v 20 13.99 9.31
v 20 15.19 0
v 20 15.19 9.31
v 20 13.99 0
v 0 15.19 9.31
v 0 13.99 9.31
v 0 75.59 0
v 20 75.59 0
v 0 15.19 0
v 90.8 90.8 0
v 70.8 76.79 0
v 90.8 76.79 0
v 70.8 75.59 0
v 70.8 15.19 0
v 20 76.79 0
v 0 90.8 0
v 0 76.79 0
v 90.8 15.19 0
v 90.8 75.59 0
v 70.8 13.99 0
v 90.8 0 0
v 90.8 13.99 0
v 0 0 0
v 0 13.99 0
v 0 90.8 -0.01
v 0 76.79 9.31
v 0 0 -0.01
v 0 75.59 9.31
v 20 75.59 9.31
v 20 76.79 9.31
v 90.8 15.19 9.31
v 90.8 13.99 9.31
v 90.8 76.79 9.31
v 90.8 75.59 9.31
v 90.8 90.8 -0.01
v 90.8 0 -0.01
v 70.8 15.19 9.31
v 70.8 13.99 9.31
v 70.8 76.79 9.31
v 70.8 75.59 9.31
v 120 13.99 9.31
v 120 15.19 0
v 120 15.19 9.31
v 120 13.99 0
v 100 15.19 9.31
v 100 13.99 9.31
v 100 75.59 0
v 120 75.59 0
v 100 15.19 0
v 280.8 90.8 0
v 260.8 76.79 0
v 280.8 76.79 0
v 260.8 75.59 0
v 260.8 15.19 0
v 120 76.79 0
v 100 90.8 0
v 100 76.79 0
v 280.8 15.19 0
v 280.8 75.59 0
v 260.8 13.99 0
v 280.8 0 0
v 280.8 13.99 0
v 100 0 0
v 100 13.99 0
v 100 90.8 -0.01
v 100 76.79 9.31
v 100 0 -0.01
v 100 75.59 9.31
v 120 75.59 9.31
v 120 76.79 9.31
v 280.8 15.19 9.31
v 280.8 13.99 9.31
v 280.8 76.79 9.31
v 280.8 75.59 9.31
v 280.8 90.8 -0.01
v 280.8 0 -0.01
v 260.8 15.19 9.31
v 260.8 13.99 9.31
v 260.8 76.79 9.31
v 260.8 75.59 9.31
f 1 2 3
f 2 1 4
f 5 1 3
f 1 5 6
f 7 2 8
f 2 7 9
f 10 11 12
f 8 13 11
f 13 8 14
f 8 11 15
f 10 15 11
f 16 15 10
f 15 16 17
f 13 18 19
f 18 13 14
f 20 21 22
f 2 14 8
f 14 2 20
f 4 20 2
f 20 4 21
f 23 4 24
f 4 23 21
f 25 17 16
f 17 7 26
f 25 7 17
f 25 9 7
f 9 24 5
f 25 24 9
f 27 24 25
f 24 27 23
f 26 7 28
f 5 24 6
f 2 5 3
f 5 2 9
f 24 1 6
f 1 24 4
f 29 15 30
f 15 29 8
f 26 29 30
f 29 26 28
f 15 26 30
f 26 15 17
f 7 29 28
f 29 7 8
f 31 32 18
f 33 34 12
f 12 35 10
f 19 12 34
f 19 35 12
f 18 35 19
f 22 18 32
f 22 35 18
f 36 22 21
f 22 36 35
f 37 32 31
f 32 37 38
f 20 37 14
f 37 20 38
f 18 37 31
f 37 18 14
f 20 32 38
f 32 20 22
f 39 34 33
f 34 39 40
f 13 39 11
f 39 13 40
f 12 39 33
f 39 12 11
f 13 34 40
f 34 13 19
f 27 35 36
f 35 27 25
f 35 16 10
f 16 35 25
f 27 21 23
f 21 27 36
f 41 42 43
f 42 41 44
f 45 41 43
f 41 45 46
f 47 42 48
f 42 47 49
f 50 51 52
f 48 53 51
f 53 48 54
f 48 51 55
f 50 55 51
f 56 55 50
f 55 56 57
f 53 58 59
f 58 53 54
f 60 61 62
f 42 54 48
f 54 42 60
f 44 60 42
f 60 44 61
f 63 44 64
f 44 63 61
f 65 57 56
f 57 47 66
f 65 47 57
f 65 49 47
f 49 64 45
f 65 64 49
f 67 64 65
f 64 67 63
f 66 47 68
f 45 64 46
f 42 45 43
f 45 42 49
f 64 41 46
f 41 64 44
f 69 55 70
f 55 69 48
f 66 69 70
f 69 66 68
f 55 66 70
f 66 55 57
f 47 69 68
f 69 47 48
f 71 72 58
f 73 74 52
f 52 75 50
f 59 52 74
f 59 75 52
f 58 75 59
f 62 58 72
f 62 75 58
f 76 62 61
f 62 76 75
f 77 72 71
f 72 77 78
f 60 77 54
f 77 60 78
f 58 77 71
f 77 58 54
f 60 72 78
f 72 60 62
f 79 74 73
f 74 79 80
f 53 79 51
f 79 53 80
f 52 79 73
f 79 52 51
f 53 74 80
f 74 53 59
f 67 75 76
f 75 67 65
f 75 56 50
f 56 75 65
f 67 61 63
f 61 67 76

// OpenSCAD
// file: ../../Base/Boxes.scad
// Fischertechnik Box Foundation
// Pre-designed Boxes

use <Constants.scad>

include <PlacementOptions.scad>

box190Width = 190;
box190Depth = 130;
box130Width = 130;
box130Depth = 95;
boxUsageHeight = 33.9;
boxWallThickness = 2.4;
boxBaseThickness = 1.0;
boxWebWidth = 3.0;

// getBoxWallThickness()
// Gets the wall thickness of a Fischertechnik Box

function getBoxWallThickness() = boxWallThickness;

// Gets the usable height of a fischertechnik box
function getBoxUsageHeight() = boxUsageHeight;

// Gets the thickness of the Fischertechnik box base.
function getBoxBaseThickness() = boxBaseThickness;

// Gets the width of a box web
function getBoxWebWidth() = boxWebWidth;

// Gets the usable inner space of a Box 190 as an x/y-list
function getBox190Space() = [
    box190Width - 2*getBoxWallThickness(), 
    box190Depth - 2*getBoxWallThickness() ];

// Imports the Fischertechnik empty box 130x190 mm and places it at position 0,0
// 190x130 are the outer sizes, the inner space is slightly smaller. Use getBox190Space() to get the inner sizes.
// This module needs the STL file "Fischertechnik Box 130x190.stl" in the library path.
// The box is positioned that the usable inner space is at the 0,0,0 position. The

module Box190() {
    translate([-getBoxWallThickness(),-getBoxWallThickness(),-getBoxBaseThickness()])
        import("Fischertechnik Box 130x190.stl", convexity=3);
}

// Gets the usable inner space of a Box 130 as an x/y-list
function getBox130Space() = [
    box130Width - 2*getBoxWallThickness(), 
    box130Depth - 2*getBoxWallThickness() ];

// Imports the Fischertechnik empty box 95x130 mm and places it at position 0,0
// 190x130 are the outer sizes, the inner space is slightly smaller. Use getBox190Space() to get the inner sizes.
// This module needs the STL file "Fischertechnik Box 95x130.stl" in the library path.
// The box is positioned that the usable inner space is at the 0,0,0 position. The

module Box130() {
    translate([-getBoxWallThickness(),-getBoxWallThickness(),-getBoxBaseThickness()])
        import("Fischertechnik Box 95x130.stl", convexity=3);
}

// Creates a web at the specified box walls
// corner 0 = LowerLeft, 1 = UpperLeft, 2 = UpperRight, 3 = LowerRight
// side 0 = LeftOfCorner, 1 = RightOfCorner
// distance = Distance in mm from the corner
// boxSpace = inner width and depth of the box (default: Box 190)
// webWidth = length of the web (default is 3 mms)
// webThickness = thickness of the web (default is 1 mm)

module BoxWeb(corner, side, distance, boxSpace=getBox190Space(), webWidth=getBoxWebWidth(), webThickness=1.0) {
    sink = getBoxWallThickness()/2;

    width = (corner % 2 == 0) ? 
            (side == LeftOfCorner ? webWidth : webThickness) :
            (side == LeftOfCorner ? webThickness : webWidth);

    depth = (corner % 2 == 0) ? 
            (side == RightOfCorner ? webWidth : webThickness) :
            (side == RightOfCorner ? webThickness : webWidth);
    
    xDiff = corner == LowerLeft ? 
                (side == LeftOfCorner ? -sink : distance) :
            (corner == UpperLeft ?                
                (side == LeftOfCorner ? distance : -sink) :
            (corner == UpperRight ?
                (side == LeftOfCorner ? boxSpace.x-webWidth+sink : boxSpace.x-distance-webThickness) :
                (side == LeftOfCorner ? boxSpace.x-distance-webThickness: boxSpace.x-webWidth+sink)));

    yDiff = corner == LowerLeft ? 
                (side == RightOfCorner ? -sink : distance) :
            (corner == UpperLeft ?
                (side == RightOfCorner ? boxSpace.y-distance : boxSpace.y-webWidth+sink) :
            (corner == UpperRight ?
                (side == RightOfCorner ? boxSpace.y-webWidth+sink : boxSpace.y-distance) :
                (side == RightOfCorner ? distance : -sink)));
    
    translate([xDiff, yDiff, -getExcess()])
        cube([width, depth, boxUsageHeight + 2*getExcess()]);
}
// file: ../../Base/Rotation.scad
// Fischertechnik Box Foundation
// Geometry Helpers Rotation

include <PlacementOptions.scad>

// getRotatedSpace(space, rotation=NoRotation)
// Rotates the space dependent on the specified rotation

function getRotatedSpace(space, rotation=NoRotation) = [
    (rotation == Rotate90 || rotation == Rotate270) ? space.y : space.x,
    (rotation == Rotate90 || rotation == Rotate270) ? space.x : space.y
];

// Rotates the given space around the fixed left lower corner
// space = the space the children needs as width/depth list [width,depth]
// rotation = 0 Rotate0 degrees, 1 Rotate90 degrees, 2 Rotate180 degrees, 3 Rotate270 degrees (equivalent to -90)

module RotateFix(space, rotation=Rotate0) {
    dy = (rotation == Rotate0 || rotation == Rotate270) ? 0 :
        (rotation == Rotate90) ? space.x :
        space.y;
    dx = (rotation < Rotate180) ? 0 :
        (rotation == Rotate180) ? space.x :
        space.y;
    
    translate([dx, dy, 0])
        rotate([0, 0, rotations[rotation]])
            children();
}
// file: ../../Base/Alignment.scad
// Fischertechnik Box Foundation
// Geometry Helpers Alignment

include <PlacementOptions.scad>

// getAlignedX(elementWidth, spaceWidth, align=AlignRight, offset=0)
// Gets the aligned X offset of an element with the given
// width in the given space.
// elementWidth = The width of the element to positon
// spaceWidth = The space where the element should be aligned
// align = 0 AlignLeft, 1 AlignCenter, 2 AlignRight
// offset = an optional offset from the aligned position. When
// aligned left or centered, then positive values are in X direction.
// When aligned right then positive values are in negative X direction.

function getAlignedX(elementWidth, spaceWidth, align=AlignRight, offset=0) =
    (align == AlignLeft) ?
        offset :
        ((align == AlignCenter) ?
        (spaceWidth - elementWidth)/2 + offset :
        spaceWidth - offset - elementWidth);

// getAlignedY(elementDepth, spaceDepth, align=AlignTop, offset=0)
// Gets the aligned Y offset of an element with the given
// depth in the given space.
// elementDepth = The depth of the element to positon
// spaceDepth = The space where the element should be aligned
// align = 0 AlignBottom, 1 AlignCenter, 2 AlignTop
// offset = an optional offset from the aligned position. When
// aligned bottom or centered, then positive values are in Y direction.
// When aligned top then positive values are in negative Y direction.

function getAlignedY(elementDepth, spaceDepth, align=AlignTop, offset=0) =
    (align == AlignBottom) ?
        offset :
        ((align == AlignCenter) ?
        (spaceDepth - elementDepth)/2 + offset :
        spaceDepth - offset - elementDepth);
// file: ../../Base/PlacementOptions.scad
// Fischertechnik Box Foundation
// Placement Options

// Alignment
NoAlign = 0;
AlignLeft = 1;
AlignBottom = 2;
AlignCenter = 3;
AlignRight = 4;
AlignTop = 5;

// Element rotation degree steps
rotations = [0, -90, -180, -270];

// Rotation
NoRotation = 0;
Rotate0 = 0;
Rotate90 = 1;
Rotate180 = 2;
Rotate270 = 3;

// Docking (seen from above)
NoDock = -1;
DockLeft = 0;
DockTop = 1;
DockRight = 2;
DockCorner = 2;
DockBottom = 3;

// Web corners
LowerLeft = 0;
UpperLeft = 1;
UpperRight = 2;
LowerRight = 3;

// Web position relative to corner
LeftOfCorner = 0;
RightOfCorner = 1;
// file: ../../Base/Placement.scad
// Fischertechnik Box Foundation
// Geometry Helpers Placement

use <Constants.scad>
use <Alignment.scad>
use <Rotation.scad>
use <Boxes.scad>

include <PlacementOptions.scad>

// Place(x=0, y=0, elementSpace=[0,0], alignX=AlignLeft, alignY=AlignBottom, rotation=Rotate0, boxSpace=getBox190Space())
// Places the child at the specified position
// y = Y-Position. This is a relative position when an X aligment is specified.
// x = X-Position. This is a relative position when an Y aligment is specified.
// elementSpace = space of the element to be placed [x,y]
// alignX = -1=NoAlign, 0 AlignLeft, 1 AlignCenter, 3 AlignRight (elementSpace and boxSpace required!)
// alignY = -1=NoAlign, 2 AlignBottom, 1 AlignCenter, 4 AlignTop (elementSpace and boxSpace required!)
// rotation = 0 Rotate0 0 degrees, 1 Rotate90 90 degrees, 
// 2 Rotate180 180 degrees, 3 Rotate270 270 degrees (equivalent to -90)
// boxSpace = Inner space of the box where the placement occurs [x,y] - default is Box 190x130 inner space

module Place(x=0, y=0, elementSpace=[0,0], 
  alignX=AlignLeft, alignY=AlignBottom, 
  rotation=NoRotation, boxSpace=getBox190Space()) {

    module Position(x, y, space, rotation=Rotate0) {
        translate([x, y, 0])
            RotateFix(space, rotation)
                children();
    }

    space = getRotatedSpace(elementSpace, rotation);
    alignedX = getAlignedX(space.x, boxSpace.x, alignX, x);
    alignedY = getAlignedY(space.y, boxSpace.y, alignY, y);
    Position(alignedX, alignedY, elementSpace, rotation)
        children();
}

// Center(space=getBox130Space(), elementSpace=[0,0])
// space = Space where the children is centered. For cylinder use centered=true and no elementSpace.
// elementSpace = space of the element to be centered [x,y]

module Center(space=getBox190Space(), elementSpace=[0,0]) {
    Place(elementSpace=elementSpace, boxSpace=space, alignX=AlignCenter, alignY=AlignCenter)
        children();
}

// CenterHorizontal(width=0, y=0, offset=0, space=getBox130Space())
// width = Width of the element to be placed.
// y = Y position of the element
// offset = Offset from the center position (negative will be left of the center)
// space = Space where the element is placed

module CenterHorizontal(width=0, y=0, offset=0, space=getBox190Space()) {
    Place(x=offset, y=y, elementSpace=[width, 0], boxSpace=space, alignX=AlignCenter)
        children(0);
}

// CenterVertical(depth=0, x=0, offset=0, space=getBox130Space())
// depth = Depth of the element to be placed.
// x = X position of the element
// offset = Offset from the center position (negative will be down of the center)
// space = Space where the element is placed

module CenterVertical(depth=0, x=0, offset=0, space=getBox190Space()) {
    Place(x=x, y=offset, elementSpace=[0, depth], boxSpace=space, alignY=AlignCenter)
        children(0);
}

// getIsVertical(align)
// True if the specified alignment needs a vertical orientation for a divider (AlignRight, AlignLeft)

function getIsVertical(align) = (align == AlignRight || align == AlignLeft);

// getIsHorizontal(align)
// True if the specified alignment needs a horizontal orientation for a divider (AlignTop, AlignBottom)

function getIsHorizontal(align) = (align == AlignTop || align == AlignBottom);
// file: ../../Base/Constants.scad
// Fischertechnik Box Foundation
// Constants

// Constant values necessary for multiple elements

// Base constants
dividerThickness = 1.2;
excess = 0.01;
fragments = 90;
tolerance = 0.8;

// Gets the thickness of a divider 
function getDividerThickness() = dividerThickness;

// Gets the excess that is used to merge walls into each other
function getExcess() = excess;

// Gets amount of fragments of a cylinder
function getFragments() = fragments;

// Gets the inner tolerance of a frame to each side
function getTolerance() = tolerance;


// Fischertechnik specific constants
axisDiameter = 4;
axisBottomDiameter = axisDiameter + 1;
standardEdgeDistance = 2.5;
standardWebDistance = 11.5;
standardCornerLength = 15;
tubeWallFactor = 0.8;
smallPartsFrameHeight = 20;

// Gets axis diameter
function getAxisDiameter() = axisDiameter;

// Gets axis bottom diameter for thicker part at the bottom
function getAxisBottomDiameter() = axisBottomDiameter;

// gets the standard distance to the wall of the box for dockable frames with webs
function getStandardEdgeDistance() = standardEdgeDistance;

// gets the standard distance of each web to the corner of the dockable frame
function getStandardWebDistance() = standardWebDistance;

// gets the standard length of the corner walls of a dockable frame
function getStandardCornerLength() = standardCornerLength;

// gets the wall thickness of a tube.
function getTubeWallThickness() = tubeWallFactor * getDividerThickness();

// gets the frame height for docked small parts boxes.
function getSmallPartsFrameHeight() = smallPartsFrameHeight;
// main file
// Fischertechnik Box Foundation
// ModelBase
// Test RailsBasePlate

use <../../ModelBase/Complex.scad>

RailsBasePlate(90, 90);

translate([100, 0])
    RailsBasePlate(180, 90);
